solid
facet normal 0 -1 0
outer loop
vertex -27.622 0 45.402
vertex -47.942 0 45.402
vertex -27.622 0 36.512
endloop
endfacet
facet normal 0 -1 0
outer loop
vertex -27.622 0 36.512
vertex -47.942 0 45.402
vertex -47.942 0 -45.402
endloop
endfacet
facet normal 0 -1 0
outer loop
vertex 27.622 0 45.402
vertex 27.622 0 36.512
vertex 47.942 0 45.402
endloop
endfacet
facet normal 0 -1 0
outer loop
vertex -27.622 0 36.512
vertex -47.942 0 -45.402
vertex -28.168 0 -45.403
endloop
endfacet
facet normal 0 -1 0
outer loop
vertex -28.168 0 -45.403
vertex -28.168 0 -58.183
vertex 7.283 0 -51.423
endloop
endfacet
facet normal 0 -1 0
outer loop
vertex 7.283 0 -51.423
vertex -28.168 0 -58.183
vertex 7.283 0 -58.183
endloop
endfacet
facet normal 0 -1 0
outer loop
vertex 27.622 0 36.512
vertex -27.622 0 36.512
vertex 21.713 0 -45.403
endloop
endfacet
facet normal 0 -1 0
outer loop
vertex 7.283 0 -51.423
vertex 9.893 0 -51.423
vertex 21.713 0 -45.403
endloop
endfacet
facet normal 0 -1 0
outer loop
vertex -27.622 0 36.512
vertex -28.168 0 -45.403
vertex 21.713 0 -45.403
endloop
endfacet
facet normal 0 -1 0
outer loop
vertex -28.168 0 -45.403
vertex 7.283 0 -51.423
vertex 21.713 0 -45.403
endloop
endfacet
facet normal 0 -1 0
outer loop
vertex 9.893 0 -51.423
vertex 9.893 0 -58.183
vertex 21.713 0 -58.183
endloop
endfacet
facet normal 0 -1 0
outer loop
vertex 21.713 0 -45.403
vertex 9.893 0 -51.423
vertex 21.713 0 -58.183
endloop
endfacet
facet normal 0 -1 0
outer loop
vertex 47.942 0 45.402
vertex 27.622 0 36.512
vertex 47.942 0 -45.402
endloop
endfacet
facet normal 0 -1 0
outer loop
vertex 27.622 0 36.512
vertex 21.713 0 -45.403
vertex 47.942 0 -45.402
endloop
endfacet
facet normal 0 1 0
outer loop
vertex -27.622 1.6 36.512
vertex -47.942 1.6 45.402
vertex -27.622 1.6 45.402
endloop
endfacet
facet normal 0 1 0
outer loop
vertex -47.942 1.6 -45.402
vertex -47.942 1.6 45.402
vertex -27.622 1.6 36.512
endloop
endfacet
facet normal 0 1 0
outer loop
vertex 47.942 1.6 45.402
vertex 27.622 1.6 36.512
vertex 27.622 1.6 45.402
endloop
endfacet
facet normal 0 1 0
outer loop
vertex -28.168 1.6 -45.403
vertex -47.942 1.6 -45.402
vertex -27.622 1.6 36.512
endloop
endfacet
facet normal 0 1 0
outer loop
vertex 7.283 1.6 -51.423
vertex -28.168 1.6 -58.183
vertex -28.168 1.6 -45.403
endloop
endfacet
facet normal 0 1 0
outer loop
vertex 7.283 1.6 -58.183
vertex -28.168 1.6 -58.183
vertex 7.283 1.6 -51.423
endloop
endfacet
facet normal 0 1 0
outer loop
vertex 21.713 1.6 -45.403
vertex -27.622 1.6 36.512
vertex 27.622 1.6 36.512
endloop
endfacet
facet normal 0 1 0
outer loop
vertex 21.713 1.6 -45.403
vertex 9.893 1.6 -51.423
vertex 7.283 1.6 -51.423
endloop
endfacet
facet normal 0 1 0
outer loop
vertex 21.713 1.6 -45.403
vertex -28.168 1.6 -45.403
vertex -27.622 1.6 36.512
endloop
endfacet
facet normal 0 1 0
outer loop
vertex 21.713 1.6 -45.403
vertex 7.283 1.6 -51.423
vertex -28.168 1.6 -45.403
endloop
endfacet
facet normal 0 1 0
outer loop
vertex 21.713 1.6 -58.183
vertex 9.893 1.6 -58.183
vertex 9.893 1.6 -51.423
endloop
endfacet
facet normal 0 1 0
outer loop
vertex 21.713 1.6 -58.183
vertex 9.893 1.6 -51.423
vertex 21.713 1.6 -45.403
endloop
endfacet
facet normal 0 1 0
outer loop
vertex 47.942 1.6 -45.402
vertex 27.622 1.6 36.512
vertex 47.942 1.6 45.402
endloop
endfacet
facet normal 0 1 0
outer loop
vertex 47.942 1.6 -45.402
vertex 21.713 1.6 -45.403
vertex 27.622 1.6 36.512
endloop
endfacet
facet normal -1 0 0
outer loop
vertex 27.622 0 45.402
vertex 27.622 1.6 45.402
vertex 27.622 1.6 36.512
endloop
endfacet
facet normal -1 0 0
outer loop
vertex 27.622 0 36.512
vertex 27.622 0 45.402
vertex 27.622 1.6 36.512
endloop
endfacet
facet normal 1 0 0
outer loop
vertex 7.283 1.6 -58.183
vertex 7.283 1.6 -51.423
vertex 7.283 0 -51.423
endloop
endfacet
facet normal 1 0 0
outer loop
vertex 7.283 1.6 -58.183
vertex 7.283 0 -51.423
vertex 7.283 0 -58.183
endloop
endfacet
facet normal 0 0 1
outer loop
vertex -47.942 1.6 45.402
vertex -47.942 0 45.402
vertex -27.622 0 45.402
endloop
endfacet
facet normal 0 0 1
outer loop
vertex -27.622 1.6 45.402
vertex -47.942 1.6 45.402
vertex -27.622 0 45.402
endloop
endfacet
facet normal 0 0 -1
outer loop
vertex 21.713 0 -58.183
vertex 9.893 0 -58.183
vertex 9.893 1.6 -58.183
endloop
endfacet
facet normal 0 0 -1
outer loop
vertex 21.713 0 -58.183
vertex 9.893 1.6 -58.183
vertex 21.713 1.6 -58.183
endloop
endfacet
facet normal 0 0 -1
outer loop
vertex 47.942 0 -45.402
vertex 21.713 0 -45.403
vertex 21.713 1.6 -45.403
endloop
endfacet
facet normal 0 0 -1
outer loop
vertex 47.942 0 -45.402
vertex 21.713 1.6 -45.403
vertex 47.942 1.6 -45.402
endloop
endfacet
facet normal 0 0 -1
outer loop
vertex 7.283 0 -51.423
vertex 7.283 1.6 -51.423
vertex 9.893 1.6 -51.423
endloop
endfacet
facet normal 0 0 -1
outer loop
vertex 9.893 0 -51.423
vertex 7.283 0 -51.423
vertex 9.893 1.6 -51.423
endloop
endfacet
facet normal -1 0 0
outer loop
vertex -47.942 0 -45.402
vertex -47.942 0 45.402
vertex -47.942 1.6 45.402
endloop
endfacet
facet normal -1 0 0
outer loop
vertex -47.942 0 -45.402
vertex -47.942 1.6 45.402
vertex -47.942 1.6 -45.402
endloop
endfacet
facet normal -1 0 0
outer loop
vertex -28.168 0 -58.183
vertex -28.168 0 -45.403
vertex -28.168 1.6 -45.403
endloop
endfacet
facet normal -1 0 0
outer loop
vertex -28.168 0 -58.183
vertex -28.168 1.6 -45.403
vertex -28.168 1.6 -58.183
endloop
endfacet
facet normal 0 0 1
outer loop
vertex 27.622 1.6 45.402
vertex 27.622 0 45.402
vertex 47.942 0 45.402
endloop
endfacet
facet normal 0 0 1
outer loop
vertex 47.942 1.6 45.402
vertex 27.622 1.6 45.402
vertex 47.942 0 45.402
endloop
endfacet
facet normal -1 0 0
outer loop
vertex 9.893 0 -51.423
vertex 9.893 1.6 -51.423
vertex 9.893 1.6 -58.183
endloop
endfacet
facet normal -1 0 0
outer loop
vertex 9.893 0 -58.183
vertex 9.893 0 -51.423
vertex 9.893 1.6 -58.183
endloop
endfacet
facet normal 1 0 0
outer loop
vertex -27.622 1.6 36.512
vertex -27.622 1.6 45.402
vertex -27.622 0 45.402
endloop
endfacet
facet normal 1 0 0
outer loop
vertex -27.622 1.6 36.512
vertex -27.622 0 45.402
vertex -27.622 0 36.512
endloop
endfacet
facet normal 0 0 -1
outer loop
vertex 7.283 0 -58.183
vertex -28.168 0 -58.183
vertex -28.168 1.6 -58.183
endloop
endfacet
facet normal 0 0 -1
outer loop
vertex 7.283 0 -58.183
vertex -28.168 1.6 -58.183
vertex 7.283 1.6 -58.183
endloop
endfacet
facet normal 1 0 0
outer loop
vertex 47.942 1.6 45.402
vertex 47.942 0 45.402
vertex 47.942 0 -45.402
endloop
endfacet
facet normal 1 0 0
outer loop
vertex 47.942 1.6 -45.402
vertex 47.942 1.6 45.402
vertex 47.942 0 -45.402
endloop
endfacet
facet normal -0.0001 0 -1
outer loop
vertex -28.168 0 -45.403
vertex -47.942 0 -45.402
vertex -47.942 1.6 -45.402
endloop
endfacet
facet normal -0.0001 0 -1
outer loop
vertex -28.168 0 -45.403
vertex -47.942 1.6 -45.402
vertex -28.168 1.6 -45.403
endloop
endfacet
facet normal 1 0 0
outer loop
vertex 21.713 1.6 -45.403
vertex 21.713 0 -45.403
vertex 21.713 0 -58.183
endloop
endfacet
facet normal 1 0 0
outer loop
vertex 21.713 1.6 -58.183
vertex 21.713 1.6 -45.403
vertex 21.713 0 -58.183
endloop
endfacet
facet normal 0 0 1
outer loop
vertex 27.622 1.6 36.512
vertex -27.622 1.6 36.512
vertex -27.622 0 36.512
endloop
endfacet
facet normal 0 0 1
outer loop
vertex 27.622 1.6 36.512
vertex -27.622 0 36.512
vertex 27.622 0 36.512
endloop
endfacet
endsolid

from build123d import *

# Parameters (mm, degrees)
SKETCH1_W           = 49.880837057
SKETCH1_H           = 12.780388143
SKETCH1_W_2         = 95.885
SKETCH1_H_2         = 90.805
BOSS_EXTRUDE1_DEPTH = 1.6
SKETCH2_W           = 55.245
SKETCH2_H           = 8.89
SKETCH2_W_2         = 2.610734202
SKETCH2_H_2         = 6.76
CUT_EXTRUDE1_DEPTH  = 1.6


with BuildPart() as part:
    # Sketch1 → Boss-Extrude1 (new body)
    with BuildSketch(Plane(origin=(0, 0, 0), x_dir=(1, 0, 0), z_dir=(0, 1, 0))):
        with Locations((-3.227112148, 51.792694072)):
            Rectangle(SKETCH1_W, SKETCH1_H)
        Rectangle(SKETCH1_W_2, SKETCH1_H_2)
    extrude(amount=BOSS_EXTRUDE1_DEPTH)

    # Sketch2 → Cut-Extrude1 (cut)
    with BuildSketch(Plane(origin=(0, 1.6, 0), x_dir=(1, 0, 0), z_dir=(0, 1, 0))):
        with Locations((0, -40.9575)):
            Rectangle(SKETCH2_W, SKETCH2_H)
        with Locations((8.587941455, 54.802888143)):
            Rectangle(SKETCH2_W_2, SKETCH2_H_2)
    extrude(amount=-CUT_EXTRUDE1_DEPTH, mode=Mode.SUBTRACT)


solid = part.part
